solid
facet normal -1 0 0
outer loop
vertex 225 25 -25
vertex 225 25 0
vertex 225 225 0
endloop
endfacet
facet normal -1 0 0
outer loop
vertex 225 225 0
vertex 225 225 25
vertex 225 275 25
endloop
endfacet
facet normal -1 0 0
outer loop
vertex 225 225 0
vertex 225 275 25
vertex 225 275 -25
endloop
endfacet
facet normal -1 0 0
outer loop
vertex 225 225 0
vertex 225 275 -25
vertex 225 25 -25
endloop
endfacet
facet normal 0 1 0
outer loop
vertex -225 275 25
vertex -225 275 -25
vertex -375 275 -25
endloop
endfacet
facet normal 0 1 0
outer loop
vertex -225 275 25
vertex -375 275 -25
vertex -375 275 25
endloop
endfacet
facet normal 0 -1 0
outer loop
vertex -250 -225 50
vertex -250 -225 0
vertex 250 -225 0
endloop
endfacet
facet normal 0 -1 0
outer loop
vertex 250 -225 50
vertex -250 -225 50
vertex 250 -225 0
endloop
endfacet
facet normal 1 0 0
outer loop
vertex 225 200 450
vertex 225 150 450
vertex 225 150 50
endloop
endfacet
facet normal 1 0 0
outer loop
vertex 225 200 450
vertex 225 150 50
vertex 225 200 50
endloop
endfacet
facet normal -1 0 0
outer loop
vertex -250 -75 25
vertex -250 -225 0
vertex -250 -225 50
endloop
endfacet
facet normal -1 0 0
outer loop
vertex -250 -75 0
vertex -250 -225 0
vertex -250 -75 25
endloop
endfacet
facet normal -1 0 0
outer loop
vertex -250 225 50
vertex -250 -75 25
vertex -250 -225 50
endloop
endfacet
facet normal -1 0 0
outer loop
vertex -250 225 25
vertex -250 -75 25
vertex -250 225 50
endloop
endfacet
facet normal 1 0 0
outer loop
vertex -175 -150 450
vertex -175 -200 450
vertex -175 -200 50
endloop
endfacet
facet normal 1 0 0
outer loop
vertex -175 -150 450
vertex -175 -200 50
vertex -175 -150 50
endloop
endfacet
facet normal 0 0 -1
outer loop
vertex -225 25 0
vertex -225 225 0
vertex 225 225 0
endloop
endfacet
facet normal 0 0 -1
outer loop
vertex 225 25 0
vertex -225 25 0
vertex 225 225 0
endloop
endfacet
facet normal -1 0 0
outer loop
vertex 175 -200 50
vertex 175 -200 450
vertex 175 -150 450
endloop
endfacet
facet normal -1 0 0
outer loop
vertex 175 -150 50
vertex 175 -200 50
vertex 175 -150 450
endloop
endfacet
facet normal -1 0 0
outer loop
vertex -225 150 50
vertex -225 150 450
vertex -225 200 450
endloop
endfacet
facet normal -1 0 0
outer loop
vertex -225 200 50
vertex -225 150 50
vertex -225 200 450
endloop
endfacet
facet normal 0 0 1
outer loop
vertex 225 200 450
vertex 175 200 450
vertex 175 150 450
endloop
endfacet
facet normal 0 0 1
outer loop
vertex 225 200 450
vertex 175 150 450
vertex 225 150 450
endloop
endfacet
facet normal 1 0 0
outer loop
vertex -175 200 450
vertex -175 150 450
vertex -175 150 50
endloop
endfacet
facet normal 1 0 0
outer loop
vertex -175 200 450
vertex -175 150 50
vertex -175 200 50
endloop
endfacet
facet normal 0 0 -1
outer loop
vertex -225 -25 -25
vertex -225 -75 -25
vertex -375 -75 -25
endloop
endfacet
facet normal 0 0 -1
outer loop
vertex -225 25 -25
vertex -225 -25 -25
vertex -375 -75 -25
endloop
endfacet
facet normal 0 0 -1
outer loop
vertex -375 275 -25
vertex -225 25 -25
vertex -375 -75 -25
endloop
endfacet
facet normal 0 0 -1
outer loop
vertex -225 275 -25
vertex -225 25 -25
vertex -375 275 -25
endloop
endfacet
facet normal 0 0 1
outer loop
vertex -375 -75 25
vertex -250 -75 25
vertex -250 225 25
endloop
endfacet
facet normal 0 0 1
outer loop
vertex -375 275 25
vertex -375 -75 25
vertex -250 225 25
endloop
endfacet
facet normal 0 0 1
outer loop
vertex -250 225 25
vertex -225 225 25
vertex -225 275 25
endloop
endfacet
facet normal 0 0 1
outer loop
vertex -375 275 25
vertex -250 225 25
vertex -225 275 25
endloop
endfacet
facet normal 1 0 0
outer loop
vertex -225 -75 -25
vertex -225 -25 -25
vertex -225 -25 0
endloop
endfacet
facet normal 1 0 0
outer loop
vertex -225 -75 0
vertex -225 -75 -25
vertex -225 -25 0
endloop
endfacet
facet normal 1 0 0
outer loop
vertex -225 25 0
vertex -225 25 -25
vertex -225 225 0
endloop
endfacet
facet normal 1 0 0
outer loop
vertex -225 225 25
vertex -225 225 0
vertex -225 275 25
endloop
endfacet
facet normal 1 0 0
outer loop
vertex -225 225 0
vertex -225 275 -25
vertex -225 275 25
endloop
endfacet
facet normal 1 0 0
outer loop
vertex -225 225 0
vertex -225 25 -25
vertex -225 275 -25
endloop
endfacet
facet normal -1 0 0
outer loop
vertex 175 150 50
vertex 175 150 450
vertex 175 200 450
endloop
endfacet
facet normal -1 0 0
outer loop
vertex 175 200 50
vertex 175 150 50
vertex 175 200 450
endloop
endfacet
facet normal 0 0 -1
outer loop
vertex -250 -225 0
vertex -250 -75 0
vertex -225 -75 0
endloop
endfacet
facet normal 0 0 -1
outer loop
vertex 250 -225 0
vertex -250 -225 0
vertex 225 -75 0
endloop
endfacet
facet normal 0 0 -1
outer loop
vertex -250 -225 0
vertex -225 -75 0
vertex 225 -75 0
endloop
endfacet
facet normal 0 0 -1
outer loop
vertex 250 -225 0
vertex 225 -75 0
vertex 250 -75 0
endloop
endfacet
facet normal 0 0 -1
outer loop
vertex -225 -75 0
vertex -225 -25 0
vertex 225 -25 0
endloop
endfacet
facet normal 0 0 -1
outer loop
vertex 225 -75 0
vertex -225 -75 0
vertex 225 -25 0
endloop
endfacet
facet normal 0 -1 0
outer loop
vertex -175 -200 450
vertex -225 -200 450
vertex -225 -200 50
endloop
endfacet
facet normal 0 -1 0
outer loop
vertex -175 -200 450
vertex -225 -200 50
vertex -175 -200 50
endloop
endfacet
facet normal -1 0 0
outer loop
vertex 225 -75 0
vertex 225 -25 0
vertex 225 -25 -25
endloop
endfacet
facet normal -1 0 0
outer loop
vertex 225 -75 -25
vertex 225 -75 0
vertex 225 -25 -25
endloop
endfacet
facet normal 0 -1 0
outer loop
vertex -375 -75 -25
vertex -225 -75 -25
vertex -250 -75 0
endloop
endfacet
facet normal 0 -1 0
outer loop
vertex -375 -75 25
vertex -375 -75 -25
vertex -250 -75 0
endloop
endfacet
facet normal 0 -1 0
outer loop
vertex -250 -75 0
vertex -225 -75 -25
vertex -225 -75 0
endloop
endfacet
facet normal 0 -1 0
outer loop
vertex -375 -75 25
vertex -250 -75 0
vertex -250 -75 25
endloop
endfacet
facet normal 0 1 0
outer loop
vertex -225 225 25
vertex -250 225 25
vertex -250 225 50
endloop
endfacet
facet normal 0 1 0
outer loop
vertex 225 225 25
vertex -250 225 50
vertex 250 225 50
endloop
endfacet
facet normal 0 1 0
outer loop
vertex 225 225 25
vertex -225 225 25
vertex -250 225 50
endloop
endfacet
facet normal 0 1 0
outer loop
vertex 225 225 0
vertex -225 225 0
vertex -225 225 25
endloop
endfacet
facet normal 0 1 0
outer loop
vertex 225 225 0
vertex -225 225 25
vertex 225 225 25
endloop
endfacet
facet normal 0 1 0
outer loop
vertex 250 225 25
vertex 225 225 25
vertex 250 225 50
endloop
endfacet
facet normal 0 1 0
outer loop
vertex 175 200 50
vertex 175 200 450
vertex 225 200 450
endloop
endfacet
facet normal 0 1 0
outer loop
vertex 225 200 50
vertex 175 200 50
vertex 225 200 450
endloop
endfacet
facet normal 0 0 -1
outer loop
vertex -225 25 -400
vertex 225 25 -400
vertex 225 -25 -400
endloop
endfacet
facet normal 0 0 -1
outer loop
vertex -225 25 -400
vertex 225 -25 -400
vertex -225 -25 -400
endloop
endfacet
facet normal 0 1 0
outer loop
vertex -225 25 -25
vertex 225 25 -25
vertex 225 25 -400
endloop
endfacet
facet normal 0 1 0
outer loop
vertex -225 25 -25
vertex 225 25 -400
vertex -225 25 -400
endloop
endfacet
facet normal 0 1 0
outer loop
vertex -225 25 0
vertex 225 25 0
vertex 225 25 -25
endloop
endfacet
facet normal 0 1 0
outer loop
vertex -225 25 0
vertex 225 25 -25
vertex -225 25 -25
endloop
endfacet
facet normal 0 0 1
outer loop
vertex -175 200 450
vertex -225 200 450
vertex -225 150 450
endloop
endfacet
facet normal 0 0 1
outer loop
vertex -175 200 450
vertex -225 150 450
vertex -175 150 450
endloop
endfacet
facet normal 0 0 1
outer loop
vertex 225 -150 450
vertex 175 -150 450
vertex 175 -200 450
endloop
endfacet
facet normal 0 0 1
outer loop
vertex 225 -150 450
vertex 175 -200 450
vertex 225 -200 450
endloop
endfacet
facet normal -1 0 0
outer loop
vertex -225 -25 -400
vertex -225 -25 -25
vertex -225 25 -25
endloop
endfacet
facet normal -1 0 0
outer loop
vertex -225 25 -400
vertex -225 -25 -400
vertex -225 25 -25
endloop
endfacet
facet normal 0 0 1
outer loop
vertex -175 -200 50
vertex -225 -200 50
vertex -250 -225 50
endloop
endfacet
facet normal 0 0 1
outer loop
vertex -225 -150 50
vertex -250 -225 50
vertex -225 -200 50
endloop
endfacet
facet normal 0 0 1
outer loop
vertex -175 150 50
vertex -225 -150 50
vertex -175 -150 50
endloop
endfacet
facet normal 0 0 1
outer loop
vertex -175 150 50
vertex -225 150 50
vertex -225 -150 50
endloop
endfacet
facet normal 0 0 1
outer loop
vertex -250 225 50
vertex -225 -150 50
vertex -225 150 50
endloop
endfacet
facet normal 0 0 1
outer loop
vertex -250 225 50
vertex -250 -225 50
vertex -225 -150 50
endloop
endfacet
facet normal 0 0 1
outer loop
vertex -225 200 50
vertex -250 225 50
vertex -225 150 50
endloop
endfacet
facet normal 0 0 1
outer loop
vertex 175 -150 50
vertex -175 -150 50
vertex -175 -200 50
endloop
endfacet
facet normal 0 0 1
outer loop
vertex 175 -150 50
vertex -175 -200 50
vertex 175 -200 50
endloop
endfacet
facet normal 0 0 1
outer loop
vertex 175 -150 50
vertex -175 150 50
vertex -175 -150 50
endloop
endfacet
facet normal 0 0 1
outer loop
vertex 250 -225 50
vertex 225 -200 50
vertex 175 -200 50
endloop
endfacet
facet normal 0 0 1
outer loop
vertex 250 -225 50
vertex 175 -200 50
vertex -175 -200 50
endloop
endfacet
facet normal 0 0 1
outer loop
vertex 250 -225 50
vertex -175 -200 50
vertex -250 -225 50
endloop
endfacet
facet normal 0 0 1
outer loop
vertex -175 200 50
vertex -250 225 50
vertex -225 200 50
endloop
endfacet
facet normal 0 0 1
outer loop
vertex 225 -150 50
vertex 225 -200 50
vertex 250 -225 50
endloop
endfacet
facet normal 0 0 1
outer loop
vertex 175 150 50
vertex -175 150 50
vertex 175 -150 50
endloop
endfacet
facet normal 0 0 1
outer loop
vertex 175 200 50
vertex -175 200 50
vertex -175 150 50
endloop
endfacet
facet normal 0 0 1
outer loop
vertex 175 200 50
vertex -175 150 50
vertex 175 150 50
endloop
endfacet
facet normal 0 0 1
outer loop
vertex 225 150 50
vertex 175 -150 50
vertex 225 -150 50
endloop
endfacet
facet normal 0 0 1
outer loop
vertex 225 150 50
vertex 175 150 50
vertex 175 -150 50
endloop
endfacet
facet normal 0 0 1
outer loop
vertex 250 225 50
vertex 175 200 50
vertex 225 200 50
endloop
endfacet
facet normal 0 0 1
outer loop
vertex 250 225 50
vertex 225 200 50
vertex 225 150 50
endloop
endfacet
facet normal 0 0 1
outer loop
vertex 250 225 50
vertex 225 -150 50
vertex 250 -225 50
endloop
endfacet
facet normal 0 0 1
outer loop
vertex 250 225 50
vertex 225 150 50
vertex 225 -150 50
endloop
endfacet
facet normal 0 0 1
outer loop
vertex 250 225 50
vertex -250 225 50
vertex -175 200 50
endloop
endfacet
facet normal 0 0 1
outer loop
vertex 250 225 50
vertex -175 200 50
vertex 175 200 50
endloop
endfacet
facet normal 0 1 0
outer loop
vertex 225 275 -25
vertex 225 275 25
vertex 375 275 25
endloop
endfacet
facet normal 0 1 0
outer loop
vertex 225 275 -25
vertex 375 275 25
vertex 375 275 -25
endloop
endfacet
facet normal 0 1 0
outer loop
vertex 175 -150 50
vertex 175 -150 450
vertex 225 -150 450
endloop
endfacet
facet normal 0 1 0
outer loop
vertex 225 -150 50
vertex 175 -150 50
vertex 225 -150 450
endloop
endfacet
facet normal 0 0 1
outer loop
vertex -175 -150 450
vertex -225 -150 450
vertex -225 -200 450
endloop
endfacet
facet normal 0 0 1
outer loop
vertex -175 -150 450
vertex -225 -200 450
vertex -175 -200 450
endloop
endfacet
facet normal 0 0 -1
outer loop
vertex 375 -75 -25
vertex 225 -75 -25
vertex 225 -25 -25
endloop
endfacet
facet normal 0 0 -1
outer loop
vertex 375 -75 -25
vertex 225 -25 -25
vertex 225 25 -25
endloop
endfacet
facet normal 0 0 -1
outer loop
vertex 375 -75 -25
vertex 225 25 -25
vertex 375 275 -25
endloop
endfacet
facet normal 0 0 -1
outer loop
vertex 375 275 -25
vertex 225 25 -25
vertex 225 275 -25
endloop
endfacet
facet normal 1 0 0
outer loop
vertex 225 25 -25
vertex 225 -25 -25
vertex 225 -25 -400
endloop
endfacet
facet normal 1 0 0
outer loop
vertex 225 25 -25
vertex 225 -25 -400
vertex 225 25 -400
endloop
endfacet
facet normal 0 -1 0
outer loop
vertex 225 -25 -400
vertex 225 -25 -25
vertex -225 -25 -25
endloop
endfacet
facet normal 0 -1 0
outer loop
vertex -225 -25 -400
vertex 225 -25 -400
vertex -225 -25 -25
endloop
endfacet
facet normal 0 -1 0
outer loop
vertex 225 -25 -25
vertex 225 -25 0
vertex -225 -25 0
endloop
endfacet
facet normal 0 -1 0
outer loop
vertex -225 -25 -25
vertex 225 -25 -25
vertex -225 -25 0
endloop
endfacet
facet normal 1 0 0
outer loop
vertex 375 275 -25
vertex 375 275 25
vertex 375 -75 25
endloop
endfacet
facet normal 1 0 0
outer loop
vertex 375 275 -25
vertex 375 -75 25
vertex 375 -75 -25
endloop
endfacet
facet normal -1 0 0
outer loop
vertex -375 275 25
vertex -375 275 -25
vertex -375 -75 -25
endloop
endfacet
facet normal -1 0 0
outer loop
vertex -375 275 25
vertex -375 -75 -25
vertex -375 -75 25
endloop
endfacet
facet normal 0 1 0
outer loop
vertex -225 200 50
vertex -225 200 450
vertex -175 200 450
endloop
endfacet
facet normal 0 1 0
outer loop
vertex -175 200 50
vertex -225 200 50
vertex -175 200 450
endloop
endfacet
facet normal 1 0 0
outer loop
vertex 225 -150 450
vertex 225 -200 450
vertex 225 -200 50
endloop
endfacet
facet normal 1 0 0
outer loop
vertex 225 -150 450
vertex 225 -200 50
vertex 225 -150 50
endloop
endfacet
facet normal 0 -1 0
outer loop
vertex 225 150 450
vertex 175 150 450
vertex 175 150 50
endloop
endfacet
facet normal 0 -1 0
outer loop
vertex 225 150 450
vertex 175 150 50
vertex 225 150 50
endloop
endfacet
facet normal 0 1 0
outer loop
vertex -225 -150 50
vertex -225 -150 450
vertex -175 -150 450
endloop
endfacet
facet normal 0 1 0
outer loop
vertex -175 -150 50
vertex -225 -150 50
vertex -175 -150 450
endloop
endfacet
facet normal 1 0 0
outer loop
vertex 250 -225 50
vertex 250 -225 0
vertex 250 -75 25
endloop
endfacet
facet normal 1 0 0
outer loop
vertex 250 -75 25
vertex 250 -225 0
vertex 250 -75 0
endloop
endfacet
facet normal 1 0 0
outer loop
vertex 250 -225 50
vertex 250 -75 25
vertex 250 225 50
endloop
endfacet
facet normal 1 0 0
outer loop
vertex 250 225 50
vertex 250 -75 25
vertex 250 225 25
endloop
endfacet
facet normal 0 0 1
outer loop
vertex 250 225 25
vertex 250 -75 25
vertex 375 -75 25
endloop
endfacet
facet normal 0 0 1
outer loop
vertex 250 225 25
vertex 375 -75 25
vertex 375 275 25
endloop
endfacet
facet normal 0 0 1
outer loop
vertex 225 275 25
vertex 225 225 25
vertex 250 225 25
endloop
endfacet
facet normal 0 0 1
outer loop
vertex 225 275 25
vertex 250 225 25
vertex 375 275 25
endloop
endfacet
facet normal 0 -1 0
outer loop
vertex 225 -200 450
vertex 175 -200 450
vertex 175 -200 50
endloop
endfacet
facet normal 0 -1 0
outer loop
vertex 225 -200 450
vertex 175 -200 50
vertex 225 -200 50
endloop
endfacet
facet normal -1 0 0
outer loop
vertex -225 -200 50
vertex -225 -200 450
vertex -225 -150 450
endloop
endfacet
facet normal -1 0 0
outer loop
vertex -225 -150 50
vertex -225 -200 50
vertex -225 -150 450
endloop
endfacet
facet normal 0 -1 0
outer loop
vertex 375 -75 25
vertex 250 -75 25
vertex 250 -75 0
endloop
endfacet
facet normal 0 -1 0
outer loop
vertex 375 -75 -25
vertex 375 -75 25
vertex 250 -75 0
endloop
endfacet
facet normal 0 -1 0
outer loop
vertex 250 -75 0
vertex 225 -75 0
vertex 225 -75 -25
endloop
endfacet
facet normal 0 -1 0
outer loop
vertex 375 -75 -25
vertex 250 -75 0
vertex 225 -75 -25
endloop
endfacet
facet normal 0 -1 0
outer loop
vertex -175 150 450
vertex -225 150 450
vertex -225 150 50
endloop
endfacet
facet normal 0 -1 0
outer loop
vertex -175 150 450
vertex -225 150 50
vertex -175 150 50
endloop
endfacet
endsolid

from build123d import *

# Parameters (mm, degrees)
SKETCH_1_W      = 500
SKETCH_1_H      = 450
EXTRUDE_1_DEPTH = 50
SKETCH_2_W      = 50
SKETCH_2_H      = 50
EXTRUDE_2_DEPTH = 450
SKETCH_3_W      = 50
SKETCH_3_H      = 50
EXTRUDE_3_DEPTH = 450
SKETCH_4_W      = 50
SKETCH_4_H      = 50
EXTRUDE_4_DEPTH = 450
SKETCH_5_W      = 50
SKETCH_5_H      = 50
EXTRUDE_5_DEPTH = 450
SKETCH_6_W      = 450
SKETCH_6_H      = 50
EXTRUDE_6_DEPTH = 400
SKETCH_7_W      = 50
SKETCH_7_H      = 350
EXTRUDE_7_DEPTH = 150
SKETCH_8_W      = 50
SKETCH_8_H      = 350
EXTRUDE_8_DEPTH = 150


with BuildPart() as part:
    # 草图1 → 凸台-拉伸1 (new body)
    with BuildSketch(Plane.XY):
        Rectangle(SKETCH_1_W, SKETCH_1_H)
    extrude(amount=EXTRUDE_1_DEPTH)

    # 草图2 → 凸台-拉伸2 (add)
    with BuildSketch(Plane.XY):
        with Locations((-200, -175)):
            Rectangle(SKETCH_2_W, SKETCH_2_H)
    extrude(amount=EXTRUDE_2_DEPTH)

    # 草图3 → 凸台-拉伸3 (add)
    with BuildSketch(Plane.XY):
        with Locations((200, -175)):
            Rectangle(SKETCH_3_W, SKETCH_3_H)
    extrude(amount=EXTRUDE_3_DEPTH)

    # 草图4 → 凸台-拉伸4 (add)
    with BuildSketch(Plane.XY):
        with Locations((-200, 175)):
            Rectangle(SKETCH_4_W, SKETCH_4_H)
    extrude(amount=EXTRUDE_4_DEPTH)

    # 草图5 → 凸台-拉伸5 (add)
    with BuildSketch(Plane.XY):
        with Locations((200, 175)):
            Rectangle(SKETCH_5_W, SKETCH_5_H)
    extrude(amount=EXTRUDE_5_DEPTH)

    # 草图6 → 凸台-拉伸6 (add)
    with BuildSketch(Plane(origin=(0, 0, 0), x_dir=(-1, 0, 0), z_dir=(0, 0, -1))):
        Rectangle(SKETCH_6_W, SKETCH_6_H)
    extrude(amount=EXTRUDE_6_DEPTH)

    # 草图7 → 凸台-拉伸7 (add)
    with BuildSketch(Plane.ZY.offset(225)):
        with Locations((0, 100)):
            Rectangle(SKETCH_7_W, SKETCH_7_H)
    extrude(amount=EXTRUDE_7_DEPTH)

    # 草图8 → 凸台-拉伸8 (add)
    with BuildSketch(Plane(origin=(225, 0, 0), x_dir=(0, 0, -1), z_dir=(1, 0, 0))):
        with Locations((0, 100)):
            Rectangle(SKETCH_8_W, SKETCH_8_H)
    extrude(amount=EXTRUDE_8_DEPTH)


solid = part.part
